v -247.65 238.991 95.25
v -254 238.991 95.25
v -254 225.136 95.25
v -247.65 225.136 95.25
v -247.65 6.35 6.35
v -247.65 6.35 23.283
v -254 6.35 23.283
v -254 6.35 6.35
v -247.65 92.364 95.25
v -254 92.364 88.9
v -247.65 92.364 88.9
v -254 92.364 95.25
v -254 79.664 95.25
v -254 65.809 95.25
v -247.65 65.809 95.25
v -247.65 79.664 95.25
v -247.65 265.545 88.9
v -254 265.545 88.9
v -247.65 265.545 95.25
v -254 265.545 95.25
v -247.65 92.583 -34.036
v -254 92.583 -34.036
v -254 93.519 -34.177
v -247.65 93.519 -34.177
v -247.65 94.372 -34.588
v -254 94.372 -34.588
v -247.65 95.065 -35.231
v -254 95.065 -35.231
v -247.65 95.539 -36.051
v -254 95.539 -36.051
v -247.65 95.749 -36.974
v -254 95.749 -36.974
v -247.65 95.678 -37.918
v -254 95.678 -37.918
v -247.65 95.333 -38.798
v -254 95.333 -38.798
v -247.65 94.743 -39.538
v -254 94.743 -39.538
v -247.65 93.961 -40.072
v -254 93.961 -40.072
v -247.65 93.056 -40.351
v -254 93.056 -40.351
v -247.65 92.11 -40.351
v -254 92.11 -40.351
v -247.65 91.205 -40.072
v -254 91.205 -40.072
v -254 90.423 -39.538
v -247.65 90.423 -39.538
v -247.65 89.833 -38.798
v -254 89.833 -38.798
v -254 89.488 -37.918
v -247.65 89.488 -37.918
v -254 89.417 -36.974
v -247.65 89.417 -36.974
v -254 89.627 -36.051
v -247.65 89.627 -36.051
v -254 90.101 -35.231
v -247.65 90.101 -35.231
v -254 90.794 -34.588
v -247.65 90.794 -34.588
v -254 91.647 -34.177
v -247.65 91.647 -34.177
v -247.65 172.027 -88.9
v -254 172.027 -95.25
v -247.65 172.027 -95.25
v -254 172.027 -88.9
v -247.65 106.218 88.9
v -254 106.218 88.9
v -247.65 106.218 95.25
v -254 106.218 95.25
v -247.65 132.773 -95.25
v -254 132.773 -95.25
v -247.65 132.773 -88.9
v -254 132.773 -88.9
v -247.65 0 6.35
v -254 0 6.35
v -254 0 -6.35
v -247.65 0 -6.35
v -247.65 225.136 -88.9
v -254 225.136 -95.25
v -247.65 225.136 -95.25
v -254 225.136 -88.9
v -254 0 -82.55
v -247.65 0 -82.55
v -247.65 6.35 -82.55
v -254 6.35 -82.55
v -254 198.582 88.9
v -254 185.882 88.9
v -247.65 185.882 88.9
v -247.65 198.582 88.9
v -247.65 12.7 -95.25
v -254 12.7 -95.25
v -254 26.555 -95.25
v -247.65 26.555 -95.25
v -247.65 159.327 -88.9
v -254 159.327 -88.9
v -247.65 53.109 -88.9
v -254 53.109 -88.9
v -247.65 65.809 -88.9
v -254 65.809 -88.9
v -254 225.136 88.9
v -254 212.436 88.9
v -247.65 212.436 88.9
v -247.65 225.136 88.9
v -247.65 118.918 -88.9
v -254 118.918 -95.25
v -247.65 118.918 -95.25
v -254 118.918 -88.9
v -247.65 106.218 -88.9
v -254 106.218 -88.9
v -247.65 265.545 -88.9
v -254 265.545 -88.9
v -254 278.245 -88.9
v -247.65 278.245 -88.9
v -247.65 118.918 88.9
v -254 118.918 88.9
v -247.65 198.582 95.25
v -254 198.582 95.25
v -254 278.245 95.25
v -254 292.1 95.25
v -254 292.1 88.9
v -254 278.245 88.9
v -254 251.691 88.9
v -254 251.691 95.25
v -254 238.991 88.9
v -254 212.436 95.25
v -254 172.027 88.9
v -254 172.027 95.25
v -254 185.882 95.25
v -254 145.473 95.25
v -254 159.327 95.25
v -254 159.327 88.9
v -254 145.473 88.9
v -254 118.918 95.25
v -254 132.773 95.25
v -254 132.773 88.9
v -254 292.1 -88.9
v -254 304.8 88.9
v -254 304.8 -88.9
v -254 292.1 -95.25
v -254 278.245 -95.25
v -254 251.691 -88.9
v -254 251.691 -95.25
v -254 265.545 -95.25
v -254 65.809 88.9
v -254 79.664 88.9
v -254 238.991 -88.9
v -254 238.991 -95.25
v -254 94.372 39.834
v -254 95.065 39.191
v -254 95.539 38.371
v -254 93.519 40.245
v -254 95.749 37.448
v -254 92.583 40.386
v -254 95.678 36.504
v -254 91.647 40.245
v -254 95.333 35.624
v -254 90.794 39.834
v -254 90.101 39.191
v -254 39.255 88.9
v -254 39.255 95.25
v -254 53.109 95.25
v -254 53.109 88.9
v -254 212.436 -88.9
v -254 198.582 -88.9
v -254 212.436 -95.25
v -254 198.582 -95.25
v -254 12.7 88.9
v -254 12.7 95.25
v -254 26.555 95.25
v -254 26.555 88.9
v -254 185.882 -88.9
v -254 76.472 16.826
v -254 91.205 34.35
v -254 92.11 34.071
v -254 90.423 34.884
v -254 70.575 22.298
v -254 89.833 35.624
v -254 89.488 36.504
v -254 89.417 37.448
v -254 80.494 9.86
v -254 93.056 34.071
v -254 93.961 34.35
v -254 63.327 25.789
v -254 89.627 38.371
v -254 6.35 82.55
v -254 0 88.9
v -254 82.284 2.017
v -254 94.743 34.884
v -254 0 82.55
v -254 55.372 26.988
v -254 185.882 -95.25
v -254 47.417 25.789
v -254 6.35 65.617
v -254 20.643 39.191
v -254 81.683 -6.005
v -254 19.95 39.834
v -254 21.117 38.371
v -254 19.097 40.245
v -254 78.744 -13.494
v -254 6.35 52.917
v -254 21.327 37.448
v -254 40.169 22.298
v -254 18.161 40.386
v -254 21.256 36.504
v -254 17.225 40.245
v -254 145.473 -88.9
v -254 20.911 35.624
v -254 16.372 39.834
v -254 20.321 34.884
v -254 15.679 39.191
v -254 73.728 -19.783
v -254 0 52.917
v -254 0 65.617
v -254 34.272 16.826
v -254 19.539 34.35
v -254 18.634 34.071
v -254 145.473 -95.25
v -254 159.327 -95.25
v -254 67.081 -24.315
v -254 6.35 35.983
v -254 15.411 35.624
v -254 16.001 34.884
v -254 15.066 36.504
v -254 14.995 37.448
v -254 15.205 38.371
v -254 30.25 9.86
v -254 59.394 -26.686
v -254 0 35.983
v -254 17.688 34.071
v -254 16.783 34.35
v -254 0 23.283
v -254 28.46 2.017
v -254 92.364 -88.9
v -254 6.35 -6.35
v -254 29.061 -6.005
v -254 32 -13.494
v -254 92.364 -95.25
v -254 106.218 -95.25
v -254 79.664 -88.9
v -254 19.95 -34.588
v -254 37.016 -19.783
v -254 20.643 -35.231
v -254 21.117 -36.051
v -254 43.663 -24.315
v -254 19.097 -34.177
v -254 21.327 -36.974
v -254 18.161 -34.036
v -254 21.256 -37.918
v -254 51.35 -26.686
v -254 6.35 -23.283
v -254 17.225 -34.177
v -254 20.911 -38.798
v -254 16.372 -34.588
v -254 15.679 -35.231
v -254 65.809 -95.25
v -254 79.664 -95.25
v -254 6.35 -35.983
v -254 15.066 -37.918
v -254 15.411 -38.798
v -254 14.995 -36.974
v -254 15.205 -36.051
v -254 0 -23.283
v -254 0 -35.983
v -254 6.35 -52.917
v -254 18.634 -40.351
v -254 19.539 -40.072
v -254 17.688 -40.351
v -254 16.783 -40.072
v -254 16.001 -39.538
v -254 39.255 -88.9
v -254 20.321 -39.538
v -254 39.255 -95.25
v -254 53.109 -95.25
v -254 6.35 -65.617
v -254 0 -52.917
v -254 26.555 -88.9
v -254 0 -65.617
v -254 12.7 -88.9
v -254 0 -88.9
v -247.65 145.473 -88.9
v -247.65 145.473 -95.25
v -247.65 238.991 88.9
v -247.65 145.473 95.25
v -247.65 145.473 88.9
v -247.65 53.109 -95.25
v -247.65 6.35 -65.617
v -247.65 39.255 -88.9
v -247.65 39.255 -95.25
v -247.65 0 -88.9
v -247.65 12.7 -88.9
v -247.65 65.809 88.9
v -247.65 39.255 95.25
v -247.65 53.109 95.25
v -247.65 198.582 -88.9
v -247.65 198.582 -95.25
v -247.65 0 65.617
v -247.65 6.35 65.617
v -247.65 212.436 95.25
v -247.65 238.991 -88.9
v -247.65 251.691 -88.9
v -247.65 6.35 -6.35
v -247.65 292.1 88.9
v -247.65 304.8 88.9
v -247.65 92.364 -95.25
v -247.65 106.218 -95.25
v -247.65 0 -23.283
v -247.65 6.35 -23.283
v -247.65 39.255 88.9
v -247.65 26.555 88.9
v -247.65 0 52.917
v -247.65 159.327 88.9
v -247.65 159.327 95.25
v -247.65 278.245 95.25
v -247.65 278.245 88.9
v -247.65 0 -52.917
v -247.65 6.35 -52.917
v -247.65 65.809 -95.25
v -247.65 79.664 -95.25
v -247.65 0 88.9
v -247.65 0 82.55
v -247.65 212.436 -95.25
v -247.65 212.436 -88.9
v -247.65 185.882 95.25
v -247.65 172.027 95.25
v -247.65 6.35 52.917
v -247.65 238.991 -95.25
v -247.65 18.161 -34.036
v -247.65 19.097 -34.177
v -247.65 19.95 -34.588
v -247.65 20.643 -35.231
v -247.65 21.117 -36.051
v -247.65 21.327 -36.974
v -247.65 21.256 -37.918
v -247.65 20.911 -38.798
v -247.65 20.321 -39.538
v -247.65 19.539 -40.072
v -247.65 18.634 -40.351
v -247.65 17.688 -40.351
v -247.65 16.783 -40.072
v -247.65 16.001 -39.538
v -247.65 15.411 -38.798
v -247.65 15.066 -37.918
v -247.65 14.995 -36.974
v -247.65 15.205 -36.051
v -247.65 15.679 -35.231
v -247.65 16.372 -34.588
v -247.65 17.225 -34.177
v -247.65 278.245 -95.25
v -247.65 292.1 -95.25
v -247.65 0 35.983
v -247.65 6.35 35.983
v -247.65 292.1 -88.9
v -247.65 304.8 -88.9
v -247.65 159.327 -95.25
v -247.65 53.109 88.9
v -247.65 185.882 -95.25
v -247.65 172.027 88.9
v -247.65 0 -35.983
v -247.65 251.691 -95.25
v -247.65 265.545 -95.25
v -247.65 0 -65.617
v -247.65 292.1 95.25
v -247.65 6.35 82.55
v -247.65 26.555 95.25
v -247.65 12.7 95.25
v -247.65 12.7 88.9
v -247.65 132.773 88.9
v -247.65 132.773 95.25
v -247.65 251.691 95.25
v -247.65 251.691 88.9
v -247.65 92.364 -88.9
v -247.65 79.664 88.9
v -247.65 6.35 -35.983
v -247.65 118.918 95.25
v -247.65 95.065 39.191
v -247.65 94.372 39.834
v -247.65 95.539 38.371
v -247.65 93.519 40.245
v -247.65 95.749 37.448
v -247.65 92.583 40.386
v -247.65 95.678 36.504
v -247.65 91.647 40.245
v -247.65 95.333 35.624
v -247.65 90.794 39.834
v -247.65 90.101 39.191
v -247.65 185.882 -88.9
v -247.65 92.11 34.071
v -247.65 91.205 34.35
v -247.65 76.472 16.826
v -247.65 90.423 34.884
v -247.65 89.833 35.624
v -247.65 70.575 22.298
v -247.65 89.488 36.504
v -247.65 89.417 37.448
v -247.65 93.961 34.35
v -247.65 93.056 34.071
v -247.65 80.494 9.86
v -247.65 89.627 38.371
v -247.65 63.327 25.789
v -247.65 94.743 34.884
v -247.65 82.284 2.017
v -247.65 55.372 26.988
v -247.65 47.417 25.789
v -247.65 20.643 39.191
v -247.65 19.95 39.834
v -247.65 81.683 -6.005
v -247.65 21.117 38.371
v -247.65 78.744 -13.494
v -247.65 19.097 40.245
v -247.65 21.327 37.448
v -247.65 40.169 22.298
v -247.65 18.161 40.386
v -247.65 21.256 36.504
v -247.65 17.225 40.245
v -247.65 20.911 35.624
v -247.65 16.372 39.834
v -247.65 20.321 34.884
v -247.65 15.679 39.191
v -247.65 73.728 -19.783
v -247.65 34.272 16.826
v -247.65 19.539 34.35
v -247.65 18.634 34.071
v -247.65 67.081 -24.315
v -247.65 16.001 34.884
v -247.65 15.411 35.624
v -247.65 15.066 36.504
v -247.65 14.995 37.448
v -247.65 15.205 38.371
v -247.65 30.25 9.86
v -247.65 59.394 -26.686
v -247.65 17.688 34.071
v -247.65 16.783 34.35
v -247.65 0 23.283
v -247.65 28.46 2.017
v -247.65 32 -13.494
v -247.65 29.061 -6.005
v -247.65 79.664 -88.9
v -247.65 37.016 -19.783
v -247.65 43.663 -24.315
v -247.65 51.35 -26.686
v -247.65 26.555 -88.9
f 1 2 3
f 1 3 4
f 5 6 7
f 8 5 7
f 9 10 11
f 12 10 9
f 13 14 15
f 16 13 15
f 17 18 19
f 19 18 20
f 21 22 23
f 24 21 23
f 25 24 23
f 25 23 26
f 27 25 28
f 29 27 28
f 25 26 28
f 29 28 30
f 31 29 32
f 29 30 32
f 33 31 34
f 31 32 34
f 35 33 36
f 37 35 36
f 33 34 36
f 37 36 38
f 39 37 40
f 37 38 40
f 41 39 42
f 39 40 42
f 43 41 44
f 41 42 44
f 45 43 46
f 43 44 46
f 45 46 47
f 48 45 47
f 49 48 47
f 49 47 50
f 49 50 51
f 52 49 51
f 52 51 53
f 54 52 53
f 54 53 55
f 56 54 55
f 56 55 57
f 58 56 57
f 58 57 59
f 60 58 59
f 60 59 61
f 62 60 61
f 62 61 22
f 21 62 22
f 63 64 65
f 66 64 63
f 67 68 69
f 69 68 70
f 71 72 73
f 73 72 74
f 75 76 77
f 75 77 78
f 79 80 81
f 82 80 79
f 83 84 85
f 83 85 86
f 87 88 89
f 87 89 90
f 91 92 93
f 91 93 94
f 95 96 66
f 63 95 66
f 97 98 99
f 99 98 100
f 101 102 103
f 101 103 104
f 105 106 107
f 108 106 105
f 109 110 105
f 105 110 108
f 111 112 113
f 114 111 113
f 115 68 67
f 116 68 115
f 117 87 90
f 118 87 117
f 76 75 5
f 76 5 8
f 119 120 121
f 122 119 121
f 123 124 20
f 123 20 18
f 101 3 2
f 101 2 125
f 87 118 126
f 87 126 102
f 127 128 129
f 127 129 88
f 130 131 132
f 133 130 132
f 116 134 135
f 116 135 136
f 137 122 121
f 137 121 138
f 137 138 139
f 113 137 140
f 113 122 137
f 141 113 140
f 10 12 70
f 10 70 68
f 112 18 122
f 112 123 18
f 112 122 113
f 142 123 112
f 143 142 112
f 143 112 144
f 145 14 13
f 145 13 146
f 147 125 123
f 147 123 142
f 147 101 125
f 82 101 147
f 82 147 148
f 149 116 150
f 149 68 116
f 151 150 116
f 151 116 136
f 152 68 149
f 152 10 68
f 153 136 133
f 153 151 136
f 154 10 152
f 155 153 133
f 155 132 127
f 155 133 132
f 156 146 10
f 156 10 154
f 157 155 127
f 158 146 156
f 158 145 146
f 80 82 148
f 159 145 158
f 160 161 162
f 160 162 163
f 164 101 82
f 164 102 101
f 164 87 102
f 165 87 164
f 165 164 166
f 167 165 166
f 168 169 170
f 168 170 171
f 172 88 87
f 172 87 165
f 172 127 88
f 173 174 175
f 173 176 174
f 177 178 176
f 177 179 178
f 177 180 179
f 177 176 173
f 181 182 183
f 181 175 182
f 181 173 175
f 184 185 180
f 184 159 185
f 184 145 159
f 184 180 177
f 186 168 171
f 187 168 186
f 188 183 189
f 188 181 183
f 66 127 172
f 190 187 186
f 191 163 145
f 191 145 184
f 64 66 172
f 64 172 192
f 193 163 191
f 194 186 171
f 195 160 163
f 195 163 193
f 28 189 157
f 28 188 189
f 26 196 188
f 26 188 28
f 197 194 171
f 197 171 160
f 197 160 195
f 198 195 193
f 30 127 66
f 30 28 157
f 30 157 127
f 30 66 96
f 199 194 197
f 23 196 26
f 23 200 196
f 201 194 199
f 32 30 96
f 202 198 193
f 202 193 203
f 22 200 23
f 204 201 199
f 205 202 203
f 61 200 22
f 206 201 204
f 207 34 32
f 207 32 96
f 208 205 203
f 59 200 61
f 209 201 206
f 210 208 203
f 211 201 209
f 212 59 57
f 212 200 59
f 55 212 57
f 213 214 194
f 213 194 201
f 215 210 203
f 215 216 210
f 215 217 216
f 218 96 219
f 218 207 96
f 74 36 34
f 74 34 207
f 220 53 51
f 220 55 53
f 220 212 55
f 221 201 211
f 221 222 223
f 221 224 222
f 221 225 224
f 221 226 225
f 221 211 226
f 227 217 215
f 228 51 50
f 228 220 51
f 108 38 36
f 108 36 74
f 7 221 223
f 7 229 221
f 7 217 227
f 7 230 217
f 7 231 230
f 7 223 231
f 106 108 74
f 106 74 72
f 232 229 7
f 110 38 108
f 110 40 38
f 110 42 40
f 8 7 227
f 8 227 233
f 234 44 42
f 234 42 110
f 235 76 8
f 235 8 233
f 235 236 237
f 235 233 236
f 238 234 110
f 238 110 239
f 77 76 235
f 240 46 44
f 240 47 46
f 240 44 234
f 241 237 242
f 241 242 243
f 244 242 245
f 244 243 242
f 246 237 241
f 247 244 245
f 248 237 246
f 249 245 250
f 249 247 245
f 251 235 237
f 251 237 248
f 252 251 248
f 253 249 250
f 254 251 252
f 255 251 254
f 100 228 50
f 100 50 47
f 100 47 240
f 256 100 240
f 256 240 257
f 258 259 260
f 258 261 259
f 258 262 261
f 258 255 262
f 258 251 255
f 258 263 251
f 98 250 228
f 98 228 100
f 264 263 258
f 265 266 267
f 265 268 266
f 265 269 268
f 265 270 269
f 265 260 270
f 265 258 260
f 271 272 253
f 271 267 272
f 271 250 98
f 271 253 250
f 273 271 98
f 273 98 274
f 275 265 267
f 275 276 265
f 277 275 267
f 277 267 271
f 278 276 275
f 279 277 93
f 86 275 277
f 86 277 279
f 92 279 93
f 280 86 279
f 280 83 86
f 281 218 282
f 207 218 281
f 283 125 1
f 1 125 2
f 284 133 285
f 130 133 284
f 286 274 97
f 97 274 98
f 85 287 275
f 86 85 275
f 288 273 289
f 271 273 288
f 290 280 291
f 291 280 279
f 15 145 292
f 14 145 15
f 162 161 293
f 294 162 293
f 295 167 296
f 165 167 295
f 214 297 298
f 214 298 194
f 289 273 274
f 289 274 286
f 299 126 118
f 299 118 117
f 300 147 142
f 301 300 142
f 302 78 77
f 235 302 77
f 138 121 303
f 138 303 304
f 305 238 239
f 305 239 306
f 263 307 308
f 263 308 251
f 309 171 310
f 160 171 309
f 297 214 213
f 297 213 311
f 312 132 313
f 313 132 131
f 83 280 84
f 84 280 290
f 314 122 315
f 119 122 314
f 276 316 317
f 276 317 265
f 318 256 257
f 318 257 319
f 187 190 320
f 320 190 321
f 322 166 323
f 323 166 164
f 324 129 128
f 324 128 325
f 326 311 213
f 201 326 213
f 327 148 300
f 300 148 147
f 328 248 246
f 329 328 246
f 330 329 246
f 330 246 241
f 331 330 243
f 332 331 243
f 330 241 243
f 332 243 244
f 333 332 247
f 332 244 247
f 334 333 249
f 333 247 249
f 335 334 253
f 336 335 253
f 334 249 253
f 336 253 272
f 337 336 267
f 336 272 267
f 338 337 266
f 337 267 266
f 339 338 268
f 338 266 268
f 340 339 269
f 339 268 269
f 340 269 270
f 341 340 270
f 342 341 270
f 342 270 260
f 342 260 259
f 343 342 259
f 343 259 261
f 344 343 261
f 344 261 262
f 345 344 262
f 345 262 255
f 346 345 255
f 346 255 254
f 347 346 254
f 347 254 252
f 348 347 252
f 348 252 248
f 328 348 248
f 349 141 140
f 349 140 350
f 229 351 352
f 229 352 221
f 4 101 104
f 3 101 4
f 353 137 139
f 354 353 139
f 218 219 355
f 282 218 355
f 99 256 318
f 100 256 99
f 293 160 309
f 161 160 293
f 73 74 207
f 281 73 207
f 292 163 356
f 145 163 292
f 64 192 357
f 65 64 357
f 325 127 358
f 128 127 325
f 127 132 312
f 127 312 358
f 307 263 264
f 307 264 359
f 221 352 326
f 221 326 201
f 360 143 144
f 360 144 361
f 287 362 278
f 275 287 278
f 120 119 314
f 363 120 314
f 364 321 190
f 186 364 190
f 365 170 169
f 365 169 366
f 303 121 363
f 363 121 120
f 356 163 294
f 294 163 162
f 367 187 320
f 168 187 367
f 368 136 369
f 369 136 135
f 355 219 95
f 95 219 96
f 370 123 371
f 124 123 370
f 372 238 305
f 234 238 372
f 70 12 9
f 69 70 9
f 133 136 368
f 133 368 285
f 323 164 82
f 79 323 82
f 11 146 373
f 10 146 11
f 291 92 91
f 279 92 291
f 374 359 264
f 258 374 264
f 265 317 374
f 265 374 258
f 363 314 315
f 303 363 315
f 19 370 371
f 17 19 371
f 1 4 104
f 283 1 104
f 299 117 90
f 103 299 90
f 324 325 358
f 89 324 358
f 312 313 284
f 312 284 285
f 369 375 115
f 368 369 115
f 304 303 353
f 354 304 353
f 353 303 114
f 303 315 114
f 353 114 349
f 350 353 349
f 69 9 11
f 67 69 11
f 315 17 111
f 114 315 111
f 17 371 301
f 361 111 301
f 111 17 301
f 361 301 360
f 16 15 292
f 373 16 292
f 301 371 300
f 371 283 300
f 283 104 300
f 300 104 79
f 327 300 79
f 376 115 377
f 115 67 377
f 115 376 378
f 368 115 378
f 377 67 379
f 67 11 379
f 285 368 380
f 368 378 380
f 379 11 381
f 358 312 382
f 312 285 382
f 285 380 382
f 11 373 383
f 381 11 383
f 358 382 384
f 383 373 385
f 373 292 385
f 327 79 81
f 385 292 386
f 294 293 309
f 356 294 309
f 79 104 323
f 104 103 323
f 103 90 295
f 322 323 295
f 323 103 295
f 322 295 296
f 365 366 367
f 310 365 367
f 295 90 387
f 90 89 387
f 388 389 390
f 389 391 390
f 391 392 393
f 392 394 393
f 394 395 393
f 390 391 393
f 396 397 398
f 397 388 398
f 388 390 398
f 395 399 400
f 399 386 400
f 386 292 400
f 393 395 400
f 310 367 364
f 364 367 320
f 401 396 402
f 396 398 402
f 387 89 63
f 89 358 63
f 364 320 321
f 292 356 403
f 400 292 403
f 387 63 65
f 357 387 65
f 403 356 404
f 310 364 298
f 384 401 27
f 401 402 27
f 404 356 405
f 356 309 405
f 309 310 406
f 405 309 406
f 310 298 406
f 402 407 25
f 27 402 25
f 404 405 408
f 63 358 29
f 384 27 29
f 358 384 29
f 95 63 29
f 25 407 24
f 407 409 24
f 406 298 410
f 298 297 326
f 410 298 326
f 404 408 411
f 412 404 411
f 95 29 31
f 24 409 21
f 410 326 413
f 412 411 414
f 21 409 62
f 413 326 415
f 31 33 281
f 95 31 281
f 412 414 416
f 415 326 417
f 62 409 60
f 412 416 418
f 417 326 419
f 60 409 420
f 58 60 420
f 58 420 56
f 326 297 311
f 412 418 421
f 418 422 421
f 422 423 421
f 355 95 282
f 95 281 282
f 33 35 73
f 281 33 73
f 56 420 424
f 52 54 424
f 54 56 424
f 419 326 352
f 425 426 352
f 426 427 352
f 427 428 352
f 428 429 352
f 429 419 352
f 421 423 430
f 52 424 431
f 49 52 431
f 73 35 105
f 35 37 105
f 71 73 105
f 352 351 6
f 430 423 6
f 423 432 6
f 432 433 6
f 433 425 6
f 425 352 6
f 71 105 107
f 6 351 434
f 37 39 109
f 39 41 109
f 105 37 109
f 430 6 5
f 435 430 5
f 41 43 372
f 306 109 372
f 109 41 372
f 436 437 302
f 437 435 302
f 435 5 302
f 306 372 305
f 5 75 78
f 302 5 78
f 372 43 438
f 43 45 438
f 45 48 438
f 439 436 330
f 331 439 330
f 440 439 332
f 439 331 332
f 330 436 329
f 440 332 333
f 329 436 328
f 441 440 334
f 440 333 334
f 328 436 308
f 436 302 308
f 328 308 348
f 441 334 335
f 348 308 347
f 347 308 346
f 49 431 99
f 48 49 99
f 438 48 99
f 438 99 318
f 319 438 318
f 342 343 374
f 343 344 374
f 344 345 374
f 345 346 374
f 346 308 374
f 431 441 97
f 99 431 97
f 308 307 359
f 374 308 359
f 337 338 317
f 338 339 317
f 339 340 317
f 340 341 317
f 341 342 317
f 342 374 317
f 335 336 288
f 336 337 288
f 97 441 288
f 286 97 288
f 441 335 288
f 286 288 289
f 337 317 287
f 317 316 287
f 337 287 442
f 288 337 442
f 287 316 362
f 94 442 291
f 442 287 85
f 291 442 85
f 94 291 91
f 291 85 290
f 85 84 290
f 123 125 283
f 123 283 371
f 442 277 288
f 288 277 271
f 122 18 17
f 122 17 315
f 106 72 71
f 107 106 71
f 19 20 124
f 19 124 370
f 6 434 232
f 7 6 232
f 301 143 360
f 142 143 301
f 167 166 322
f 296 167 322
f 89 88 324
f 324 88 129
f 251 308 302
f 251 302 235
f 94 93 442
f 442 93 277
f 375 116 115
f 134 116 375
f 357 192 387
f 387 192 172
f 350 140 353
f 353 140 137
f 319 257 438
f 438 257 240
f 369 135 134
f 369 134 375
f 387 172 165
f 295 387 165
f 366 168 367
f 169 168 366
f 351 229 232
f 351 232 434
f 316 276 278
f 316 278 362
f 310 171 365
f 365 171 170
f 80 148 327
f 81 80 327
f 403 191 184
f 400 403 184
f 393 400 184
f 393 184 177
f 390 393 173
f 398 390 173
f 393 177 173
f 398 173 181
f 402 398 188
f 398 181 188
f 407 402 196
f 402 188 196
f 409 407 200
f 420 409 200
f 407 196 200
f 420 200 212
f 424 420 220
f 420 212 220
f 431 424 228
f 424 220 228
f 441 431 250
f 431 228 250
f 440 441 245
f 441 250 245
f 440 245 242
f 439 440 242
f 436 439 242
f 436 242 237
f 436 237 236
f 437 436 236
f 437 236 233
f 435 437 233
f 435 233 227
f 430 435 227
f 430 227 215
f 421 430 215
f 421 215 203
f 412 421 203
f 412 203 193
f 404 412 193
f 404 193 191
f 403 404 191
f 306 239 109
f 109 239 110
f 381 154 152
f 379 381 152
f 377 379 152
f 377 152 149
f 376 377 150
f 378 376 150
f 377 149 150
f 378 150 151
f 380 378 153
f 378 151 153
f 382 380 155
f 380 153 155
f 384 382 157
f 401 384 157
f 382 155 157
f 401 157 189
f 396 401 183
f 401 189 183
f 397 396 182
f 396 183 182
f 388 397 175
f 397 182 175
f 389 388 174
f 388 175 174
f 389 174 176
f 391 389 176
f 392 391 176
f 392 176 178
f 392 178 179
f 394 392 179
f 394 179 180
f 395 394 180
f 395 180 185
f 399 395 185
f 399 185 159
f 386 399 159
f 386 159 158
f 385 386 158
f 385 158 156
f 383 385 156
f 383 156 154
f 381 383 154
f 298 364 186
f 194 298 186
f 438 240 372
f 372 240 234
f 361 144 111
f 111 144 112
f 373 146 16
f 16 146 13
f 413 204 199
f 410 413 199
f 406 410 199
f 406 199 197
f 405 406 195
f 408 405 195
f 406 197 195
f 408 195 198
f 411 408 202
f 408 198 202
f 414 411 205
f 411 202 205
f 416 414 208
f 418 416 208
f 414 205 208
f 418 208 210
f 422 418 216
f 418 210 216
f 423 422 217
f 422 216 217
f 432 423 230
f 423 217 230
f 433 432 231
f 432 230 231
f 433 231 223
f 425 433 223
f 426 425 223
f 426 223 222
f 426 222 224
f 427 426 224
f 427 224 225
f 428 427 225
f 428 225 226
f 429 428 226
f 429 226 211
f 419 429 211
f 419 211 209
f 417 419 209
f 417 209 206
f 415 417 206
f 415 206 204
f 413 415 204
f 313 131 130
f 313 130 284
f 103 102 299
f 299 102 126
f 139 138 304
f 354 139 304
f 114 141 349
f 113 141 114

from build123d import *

# Parameters (mm, degrees)
SKETCH1_W           = 508
SKETCH1_H           = 190.5
BOSS_EXTRUDE1_DEPTH = 6.35
SKETCH2_W           = 508
SKETCH2_H           = 190.5
SKETCH2_W_2         = 495.3
SKETCH2_H_2         = 177.8
BOSS_EXTRUDE2_DEPTH = 298.45
SKETCH3_W           = 6.35
SKETCH3_H           = 16.933333333
SKETCH3_H_2         = 16.933333334
CUT_EXTRUDE1_DEPTH  = 12.7
SKETCH4_W           = 6.35
SKETCH4_H           = 15.875
CUT_EXTRUDE2_DEPTH  = 6.35
SKETCH6_W           = 514.801062296
SKETCH6_H           = 254.881465808
CUT_EXTRUDE5_DEPTH  = 305.8
SKETCH5_W           = 6.35
SKETCH5_H           = 16.933333333
SKETCH5_H_2         = 16.933333334
CUT_EXTRUDE6_DEPTH  = 6.35
SKETCH7_W           = 6.35
SKETCH7_H           = 12.7
CUT_EXTRUDE7_DEPTH  = 7.35
SKETCH8_R           = 26.9875
SKETCH8_R_2         = 3.175
CUT_EXTRUDE8_DEPTH  = 7.35


with BuildPart() as part:
    # Sketch1 → Boss-Extrude1 (new body)
    with BuildSketch(Plane(origin=(0, 0, 0), x_dir=(1, 0, 0), z_dir=(0, 1, 0))):
        Rectangle(SKETCH1_W, SKETCH1_H)
    extrude(amount=BOSS_EXTRUDE1_DEPTH)

    # Sketch2 → Boss-Extrude2 (add)
    with BuildSketch(Plane(origin=(0, 6.35, 0), x_dir=(1, 0, 0), z_dir=(0, 1, 0))):
        Rectangle(SKETCH2_W, SKETCH2_H)
        Rectangle(SKETCH2_W_2, SKETCH2_H_2, mode=Mode.SUBTRACT)
    extrude(amount=BOSS_EXTRUDE2_DEPTH)

    # Sketch3 → Cut-Extrude1 (cut)
    with BuildSketch(Plane.XY.offset(95.25)):
        with BuildLine():
            Line((-3.302, 283.21), (-3.302, 6.35))
            Line((-3.302, 6.35), (3.302, 6.35))
            Line((3.302, 6.35), (3.302, 292.354))
            Line((3.302, 292.354), (-16.256, 292.354))
            Line((-16.256, 292.354), (-16.256, 285.75))
            Line((-16.256, 285.75), (-5.842, 285.75))
            ThreePointArc((-5.842, 285.75), (-4.045948776, 285.006051224), (-3.302, 283.21))
        make_face()
        with Locations((12.827, 80.433333334)):
            Rectangle(SKETCH3_W, SKETCH3_H)
        with Locations((12.827, 50.8)):
            Rectangle(SKETCH3_W, SKETCH3_H_2)
        with Locations((12.827, 21.166666667)):
            Rectangle(SKETCH3_W, SKETCH3_H)
    extrude(amount=-CUT_EXTRUDE1_DEPTH, mode=Mode.SUBTRACT)

    # Sketch4 → Cut-Extrude2 (cut)
    with BuildSketch(Plane.XY.offset(-88.9)):
        with Locations((-19.431, 284.1625)):
            Rectangle(SKETCH4_W, SKETCH4_H)
        with Locations((-19.431, 255.5875)):
            Rectangle(SKETCH4_W, SKETCH4_H)
        with Locations((-19.431, 227.0125)):
            Rectangle(SKETCH4_W, SKETCH4_H)
        with Locations((-19.431, 198.4375)):
            Rectangle(SKETCH4_W, SKETCH4_H)
        with Locations((-19.431, 169.8625)):
            Rectangle(SKETCH4_W, SKETCH4_H)
        with Locations((-19.431, 141.2875)):
            Rectangle(SKETCH4_W, SKETCH4_H)
        with Locations((-19.431, 112.7125)):
            Rectangle(SKETCH4_W, SKETCH4_H)
        with Locations((-19.431, 84.1375)):
            Rectangle(SKETCH4_W, SKETCH4_H)
        with Locations((-19.431, 55.5625)):
            Rectangle(SKETCH4_W, SKETCH4_H)
        with Locations((-19.431, 26.9875)):
            Rectangle(SKETCH4_W, SKETCH4_H)
    cut_extrude2 = extrude(amount=-CUT_EXTRUDE2_DEPTH, mode=Mode.SUBTRACT)

    # Mirror1: Cut-Extrude2 across plane
    add(cut_extrude2.mirror(Plane.ZY.offset(6.477)), mode=Mode.SUBTRACT)

    # Sketch6 → Cut-Extrude5 (cut, through all)
    with BuildSketch(Plane(origin=(0, 0, 0), x_dir=(1, 0, 0), z_dir=(0, 1, 0))):
        with Locations((9.750531148, -10.000845247)):
            Rectangle(SKETCH6_W, SKETCH6_H)
    extrude(amount=CUT_EXTRUDE5_DEPTH, mode=Mode.SUBTRACT)

    # Sketch5 → Cut-Extrude6 (cut)
    with BuildSketch(Plane(origin=(0, 0, 0), x_dir=(-1, 0, 0), z_dir=(0, -1, 0))):
        with Locations((250.825, -74.083333334)):
            Rectangle(SKETCH5_W, SKETCH5_H)
        with Locations((250.825, -44.45)):
            Rectangle(SKETCH5_W, SKETCH5_H_2)
        with Locations((250.825, -14.816666667)):
            Rectangle(SKETCH5_W, SKETCH5_H)
        with Locations((250.825, 14.816666667)):
            Rectangle(SKETCH5_W, SKETCH5_H)
        with Locations((250.825, 44.45)):
            Rectangle(SKETCH5_W, SKETCH5_H_2)
        with Locations((250.825, 74.083333334)):
            Rectangle(SKETCH5_W, SKETCH5_H)
    extrude(amount=-CUT_EXTRUDE6_DEPTH, mode=Mode.SUBTRACT)

    # Sketch7 → Cut-Extrude7 (cut, through all)
    with BuildSketch(Plane.ZY.offset(254)):
        with Locations((-92.075, 32.904545455)):
            Rectangle(SKETCH7_W, SKETCH7_H)
        with Locations((-92.075, 6.35)):
            Rectangle(SKETCH7_W, SKETCH7_H)
        with Locations((-92.075, 59.459090909)):
            Rectangle(SKETCH7_W, SKETCH7_H)
        with Locations((-92.075, 86.013636364)):
            Rectangle(SKETCH7_W, SKETCH7_H)
        with Locations((-92.075, 112.568181818)):
            Rectangle(SKETCH7_W, SKETCH7_H)
        with Locations((-92.075, 139.122727273)):
            Rectangle(SKETCH7_W, SKETCH7_H)
        with Locations((-92.075, 165.677272727)):
            Rectangle(SKETCH7_W, SKETCH7_H)
        with Locations((-92.075, 192.231818182)):
            Rectangle(SKETCH7_W, SKETCH7_H)
        with Locations((-92.075, 218.786363636)):
            Rectangle(SKETCH7_W, SKETCH7_H)
        with Locations((-92.075, 245.340909091)):
            Rectangle(SKETCH7_W, SKETCH7_H)
        with Locations((-92.075, 271.895454545)):
            Rectangle(SKETCH7_W, SKETCH7_H)
        with Locations((-92.075, 298.45)):
            Rectangle(SKETCH7_W, SKETCH7_H)
        with Locations((92.075, 298.45)):
            Rectangle(SKETCH7_W, SKETCH7_H)
        with Locations((92.075, 271.895454545)):
            Rectangle(SKETCH7_W, SKETCH7_H)
        with Locations((92.075, 245.340909091)):
            Rectangle(SKETCH7_W, SKETCH7_H)
        with Locations((92.075, 218.786363636)):
            Rectangle(SKETCH7_W, SKETCH7_H)
        with Locations((92.075, 192.231818182)):
            Rectangle(SKETCH7_W, SKETCH7_H)
        with Locations((92.075, 165.677272727)):
            Rectangle(SKETCH7_W, SKETCH7_H)
        with Locations((92.075, 139.122727273)):
            Rectangle(SKETCH7_W, SKETCH7_H)
        with Locations((92.075, 112.568181818)):
            Rectangle(SKETCH7_W, SKETCH7_H)
        with Locations((92.075, 86.013636364)):
            Rectangle(SKETCH7_W, SKETCH7_H)
        with Locations((92.075, 59.459090909)):
            Rectangle(SKETCH7_W, SKETCH7_H)
        with Locations((92.075, 32.904545455)):
            Rectangle(SKETCH7_W, SKETCH7_H)
        with Locations((92.075, 6.35)):
            Rectangle(SKETCH7_W, SKETCH7_H)
    extrude(amount=-CUT_EXTRUDE7_DEPTH, mode=Mode.SUBTRACT)

    # Sketch8 → Cut-Extrude8 (cut, through all)
    with BuildSketch(Plane.ZY.offset(254)):
        with Locations((0, 55.372)):
            Circle(SKETCH8_R)
        with Locations((-37.211, 92.583)):
            Circle(SKETCH8_R_2)
        with Locations((37.211, 92.583)):
            Circle(SKETCH8_R_2)
        with Locations((37.211, 18.161)):
            Circle(SKETCH8_R_2)
        with Locations((-37.211, 18.161)):
            Circle(SKETCH8_R_2)
    extrude(amount=-CUT_EXTRUDE8_DEPTH, mode=Mode.SUBTRACT)


solid = part.part
